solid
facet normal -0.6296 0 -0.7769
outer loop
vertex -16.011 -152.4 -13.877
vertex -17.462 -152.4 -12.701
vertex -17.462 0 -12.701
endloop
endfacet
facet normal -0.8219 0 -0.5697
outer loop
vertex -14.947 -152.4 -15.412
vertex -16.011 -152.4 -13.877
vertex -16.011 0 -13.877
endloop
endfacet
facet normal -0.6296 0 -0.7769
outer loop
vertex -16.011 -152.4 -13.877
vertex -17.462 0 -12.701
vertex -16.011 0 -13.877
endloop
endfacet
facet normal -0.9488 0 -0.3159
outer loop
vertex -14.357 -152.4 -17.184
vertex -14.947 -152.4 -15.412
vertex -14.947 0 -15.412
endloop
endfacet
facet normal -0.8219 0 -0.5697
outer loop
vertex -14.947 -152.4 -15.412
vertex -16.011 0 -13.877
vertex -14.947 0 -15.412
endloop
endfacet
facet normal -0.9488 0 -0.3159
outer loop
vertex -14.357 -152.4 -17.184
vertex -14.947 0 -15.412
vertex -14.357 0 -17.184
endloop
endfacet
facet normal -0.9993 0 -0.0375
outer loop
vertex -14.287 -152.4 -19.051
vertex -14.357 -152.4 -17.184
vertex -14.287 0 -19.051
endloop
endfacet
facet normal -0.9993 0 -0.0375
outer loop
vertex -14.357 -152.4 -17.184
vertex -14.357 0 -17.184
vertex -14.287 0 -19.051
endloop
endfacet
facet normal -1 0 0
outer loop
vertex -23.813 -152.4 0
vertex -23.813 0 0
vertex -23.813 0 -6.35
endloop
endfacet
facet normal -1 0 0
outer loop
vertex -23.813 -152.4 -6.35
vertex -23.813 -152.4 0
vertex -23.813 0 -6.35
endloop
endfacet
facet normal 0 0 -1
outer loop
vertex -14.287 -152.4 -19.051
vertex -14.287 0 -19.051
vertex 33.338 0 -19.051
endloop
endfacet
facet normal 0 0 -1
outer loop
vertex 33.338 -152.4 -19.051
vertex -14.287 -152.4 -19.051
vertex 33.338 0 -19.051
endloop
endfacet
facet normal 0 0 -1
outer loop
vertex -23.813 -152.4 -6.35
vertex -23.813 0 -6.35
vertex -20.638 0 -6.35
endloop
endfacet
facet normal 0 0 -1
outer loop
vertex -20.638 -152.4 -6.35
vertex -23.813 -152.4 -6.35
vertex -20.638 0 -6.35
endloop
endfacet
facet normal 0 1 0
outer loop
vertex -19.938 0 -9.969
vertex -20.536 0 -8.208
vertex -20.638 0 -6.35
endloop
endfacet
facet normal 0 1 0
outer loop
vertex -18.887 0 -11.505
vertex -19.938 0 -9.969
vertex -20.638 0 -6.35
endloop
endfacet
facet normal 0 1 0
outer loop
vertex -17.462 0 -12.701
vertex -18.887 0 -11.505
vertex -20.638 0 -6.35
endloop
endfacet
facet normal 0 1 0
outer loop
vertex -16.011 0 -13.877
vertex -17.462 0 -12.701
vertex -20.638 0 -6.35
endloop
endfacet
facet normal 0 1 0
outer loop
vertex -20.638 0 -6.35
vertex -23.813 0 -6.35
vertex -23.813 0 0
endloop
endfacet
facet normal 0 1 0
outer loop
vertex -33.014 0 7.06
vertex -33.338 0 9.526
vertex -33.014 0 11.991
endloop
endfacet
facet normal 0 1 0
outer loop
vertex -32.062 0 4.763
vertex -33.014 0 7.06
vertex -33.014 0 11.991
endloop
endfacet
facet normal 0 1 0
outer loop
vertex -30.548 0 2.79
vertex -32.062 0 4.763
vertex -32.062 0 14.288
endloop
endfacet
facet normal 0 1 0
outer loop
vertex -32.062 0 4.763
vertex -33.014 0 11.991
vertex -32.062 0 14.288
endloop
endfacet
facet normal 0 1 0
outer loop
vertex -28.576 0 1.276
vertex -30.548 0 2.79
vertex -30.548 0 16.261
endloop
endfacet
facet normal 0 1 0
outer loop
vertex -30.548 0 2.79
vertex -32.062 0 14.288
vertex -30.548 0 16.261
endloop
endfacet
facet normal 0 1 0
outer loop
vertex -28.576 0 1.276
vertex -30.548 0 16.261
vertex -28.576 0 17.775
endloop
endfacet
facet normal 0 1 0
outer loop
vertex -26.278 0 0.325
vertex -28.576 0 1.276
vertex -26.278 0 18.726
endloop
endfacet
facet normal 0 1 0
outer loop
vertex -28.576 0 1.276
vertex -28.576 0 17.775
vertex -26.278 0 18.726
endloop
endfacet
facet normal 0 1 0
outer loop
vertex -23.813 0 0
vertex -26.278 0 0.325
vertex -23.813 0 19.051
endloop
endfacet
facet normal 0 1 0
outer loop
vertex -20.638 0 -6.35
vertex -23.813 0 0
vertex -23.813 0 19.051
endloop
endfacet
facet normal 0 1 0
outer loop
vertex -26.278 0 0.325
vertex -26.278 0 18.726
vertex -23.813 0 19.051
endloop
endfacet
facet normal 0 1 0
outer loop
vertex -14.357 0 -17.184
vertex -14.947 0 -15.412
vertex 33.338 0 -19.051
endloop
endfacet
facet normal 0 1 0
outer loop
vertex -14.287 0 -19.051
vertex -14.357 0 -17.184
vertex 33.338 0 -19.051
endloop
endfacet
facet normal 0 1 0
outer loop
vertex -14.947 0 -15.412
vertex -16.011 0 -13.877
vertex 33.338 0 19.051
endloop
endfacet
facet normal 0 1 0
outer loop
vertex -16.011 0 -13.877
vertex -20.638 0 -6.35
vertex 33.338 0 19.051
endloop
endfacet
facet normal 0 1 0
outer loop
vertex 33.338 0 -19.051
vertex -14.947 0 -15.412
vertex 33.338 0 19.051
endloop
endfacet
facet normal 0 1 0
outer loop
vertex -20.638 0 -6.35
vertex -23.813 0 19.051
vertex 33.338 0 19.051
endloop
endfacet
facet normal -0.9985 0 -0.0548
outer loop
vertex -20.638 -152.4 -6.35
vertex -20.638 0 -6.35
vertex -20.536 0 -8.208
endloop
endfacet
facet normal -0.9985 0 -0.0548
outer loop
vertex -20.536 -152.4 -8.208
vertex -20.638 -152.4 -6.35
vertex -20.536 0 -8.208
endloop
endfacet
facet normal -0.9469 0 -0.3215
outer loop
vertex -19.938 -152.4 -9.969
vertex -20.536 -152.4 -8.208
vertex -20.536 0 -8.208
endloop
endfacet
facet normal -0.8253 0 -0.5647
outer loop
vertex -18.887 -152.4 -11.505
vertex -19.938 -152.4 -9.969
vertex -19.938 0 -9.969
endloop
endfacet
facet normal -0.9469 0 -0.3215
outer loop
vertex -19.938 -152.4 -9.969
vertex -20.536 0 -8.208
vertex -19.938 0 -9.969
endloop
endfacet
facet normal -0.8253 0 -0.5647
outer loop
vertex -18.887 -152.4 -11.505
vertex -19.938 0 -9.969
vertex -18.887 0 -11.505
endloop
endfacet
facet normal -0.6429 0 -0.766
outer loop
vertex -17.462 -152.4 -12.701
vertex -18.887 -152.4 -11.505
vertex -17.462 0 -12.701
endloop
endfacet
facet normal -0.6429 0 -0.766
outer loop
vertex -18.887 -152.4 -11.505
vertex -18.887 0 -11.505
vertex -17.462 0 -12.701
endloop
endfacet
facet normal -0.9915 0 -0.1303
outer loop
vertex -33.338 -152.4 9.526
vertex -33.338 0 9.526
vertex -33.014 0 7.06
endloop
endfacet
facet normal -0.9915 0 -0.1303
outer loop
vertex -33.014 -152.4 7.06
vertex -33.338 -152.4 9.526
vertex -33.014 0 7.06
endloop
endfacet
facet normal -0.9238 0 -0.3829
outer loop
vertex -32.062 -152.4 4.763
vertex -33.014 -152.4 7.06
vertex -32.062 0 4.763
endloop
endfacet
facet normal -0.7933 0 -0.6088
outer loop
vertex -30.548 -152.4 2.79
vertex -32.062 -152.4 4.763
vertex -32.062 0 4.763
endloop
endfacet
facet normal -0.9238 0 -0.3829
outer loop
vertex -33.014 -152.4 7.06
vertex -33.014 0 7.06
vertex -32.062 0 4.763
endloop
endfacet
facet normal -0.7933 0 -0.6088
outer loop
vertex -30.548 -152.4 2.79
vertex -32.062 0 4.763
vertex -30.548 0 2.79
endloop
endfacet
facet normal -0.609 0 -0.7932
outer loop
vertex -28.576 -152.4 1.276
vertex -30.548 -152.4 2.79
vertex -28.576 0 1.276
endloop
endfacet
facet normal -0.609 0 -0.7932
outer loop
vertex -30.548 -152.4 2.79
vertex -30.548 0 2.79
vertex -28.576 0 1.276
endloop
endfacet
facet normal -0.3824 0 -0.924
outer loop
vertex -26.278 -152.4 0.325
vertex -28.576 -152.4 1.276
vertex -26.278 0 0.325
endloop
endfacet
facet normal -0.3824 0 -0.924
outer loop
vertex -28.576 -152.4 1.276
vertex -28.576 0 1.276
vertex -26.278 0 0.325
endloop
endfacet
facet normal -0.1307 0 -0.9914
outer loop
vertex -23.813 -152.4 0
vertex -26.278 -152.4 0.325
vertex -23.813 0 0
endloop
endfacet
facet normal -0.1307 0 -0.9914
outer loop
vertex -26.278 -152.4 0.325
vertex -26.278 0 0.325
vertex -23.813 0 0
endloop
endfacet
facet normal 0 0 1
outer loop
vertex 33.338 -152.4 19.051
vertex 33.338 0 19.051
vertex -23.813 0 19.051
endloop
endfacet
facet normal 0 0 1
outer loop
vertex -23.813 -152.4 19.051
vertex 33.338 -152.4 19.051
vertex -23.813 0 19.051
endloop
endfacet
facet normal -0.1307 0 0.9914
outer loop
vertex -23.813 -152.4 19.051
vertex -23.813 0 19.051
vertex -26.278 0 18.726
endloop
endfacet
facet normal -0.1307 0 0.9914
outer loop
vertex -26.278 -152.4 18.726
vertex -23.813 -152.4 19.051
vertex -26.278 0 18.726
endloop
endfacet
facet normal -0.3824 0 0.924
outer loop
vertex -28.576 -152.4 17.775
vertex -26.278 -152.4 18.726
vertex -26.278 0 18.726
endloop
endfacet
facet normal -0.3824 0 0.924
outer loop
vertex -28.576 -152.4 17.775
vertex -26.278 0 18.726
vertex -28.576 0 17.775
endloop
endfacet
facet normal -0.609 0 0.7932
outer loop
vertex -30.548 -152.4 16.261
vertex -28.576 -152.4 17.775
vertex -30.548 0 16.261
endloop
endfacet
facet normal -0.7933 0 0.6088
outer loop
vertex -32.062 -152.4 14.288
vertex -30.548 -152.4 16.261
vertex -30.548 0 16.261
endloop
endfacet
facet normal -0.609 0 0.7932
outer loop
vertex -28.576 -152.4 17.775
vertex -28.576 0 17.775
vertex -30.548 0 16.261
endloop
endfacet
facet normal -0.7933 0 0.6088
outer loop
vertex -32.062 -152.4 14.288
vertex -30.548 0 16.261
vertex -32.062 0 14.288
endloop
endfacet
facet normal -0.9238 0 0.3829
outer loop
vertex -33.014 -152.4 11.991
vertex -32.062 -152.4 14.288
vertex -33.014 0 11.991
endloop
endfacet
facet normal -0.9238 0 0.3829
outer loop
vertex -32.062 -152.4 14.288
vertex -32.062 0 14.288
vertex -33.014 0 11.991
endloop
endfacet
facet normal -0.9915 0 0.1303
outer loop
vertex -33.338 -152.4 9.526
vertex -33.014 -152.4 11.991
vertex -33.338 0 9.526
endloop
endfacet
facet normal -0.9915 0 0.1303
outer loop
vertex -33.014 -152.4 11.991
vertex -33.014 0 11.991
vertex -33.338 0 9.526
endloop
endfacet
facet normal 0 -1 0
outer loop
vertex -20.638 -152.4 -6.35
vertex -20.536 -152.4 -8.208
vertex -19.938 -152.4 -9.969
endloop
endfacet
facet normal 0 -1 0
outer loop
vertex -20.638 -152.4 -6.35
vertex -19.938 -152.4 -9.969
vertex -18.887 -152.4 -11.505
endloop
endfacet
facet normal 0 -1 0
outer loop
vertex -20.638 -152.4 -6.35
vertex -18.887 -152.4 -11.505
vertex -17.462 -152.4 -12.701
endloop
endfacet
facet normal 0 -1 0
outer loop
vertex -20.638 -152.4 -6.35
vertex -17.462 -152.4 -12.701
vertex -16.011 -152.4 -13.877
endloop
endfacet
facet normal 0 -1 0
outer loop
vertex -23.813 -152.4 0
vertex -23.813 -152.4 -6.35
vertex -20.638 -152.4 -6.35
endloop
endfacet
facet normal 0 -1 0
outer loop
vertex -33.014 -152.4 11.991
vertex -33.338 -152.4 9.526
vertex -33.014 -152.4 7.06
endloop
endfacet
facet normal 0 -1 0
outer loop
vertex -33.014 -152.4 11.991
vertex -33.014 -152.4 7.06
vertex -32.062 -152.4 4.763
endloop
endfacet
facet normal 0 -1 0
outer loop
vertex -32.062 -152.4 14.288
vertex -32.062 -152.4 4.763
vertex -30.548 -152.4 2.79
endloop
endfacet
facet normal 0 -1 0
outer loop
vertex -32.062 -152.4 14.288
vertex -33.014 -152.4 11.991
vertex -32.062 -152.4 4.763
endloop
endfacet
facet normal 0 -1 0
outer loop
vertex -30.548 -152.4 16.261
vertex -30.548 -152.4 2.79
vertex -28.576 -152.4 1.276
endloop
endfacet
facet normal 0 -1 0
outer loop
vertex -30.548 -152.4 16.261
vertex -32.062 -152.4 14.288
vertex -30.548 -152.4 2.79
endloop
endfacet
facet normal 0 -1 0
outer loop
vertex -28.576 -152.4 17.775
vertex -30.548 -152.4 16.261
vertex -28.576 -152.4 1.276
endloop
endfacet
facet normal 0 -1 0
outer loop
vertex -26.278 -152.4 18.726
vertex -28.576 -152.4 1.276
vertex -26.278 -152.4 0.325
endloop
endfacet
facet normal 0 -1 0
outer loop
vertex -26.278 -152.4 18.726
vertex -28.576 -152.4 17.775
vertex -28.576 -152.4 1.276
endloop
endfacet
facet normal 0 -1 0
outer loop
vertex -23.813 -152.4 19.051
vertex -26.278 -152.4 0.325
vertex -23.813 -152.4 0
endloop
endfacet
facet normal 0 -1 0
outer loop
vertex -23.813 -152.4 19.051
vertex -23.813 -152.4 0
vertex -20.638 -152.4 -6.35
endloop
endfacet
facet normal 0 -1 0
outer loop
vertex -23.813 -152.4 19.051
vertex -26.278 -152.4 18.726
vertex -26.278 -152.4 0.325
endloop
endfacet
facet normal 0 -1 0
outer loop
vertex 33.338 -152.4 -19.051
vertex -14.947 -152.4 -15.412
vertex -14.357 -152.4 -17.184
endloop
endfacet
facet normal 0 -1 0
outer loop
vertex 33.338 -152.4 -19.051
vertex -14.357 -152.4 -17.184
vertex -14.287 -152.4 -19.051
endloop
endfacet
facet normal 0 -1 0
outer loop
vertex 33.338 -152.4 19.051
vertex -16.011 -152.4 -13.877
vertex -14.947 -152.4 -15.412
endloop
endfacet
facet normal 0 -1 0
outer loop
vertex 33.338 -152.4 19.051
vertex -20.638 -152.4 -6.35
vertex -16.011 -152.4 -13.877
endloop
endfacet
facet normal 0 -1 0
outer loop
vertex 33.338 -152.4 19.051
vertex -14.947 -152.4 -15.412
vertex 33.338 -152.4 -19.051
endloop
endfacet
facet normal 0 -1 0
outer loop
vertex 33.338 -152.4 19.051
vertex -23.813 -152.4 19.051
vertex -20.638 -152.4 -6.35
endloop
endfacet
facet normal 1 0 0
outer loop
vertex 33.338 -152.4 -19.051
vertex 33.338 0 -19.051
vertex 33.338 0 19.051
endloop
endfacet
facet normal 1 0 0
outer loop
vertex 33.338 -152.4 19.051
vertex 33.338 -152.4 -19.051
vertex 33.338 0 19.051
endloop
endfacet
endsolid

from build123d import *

# Parameters (mm, degrees)
F0_W     = 38.1
F0_H     = 19.05
F0_H_2   = 19.0520574
F1_DEPTH = 152.4


# Not quite as in the source:
# - ends of sketch curves that miss each other by under 0.0002 mm in the source are joined


with BuildPart() as f1:
    # F0 (on Front) → F1 (new body)
    with BuildSketch(Plane.XZ):
        with Locations((14.288262, -9.5260414)):
            Rectangle(F0_W, F0_H)
        with BuildLine():
            Line((-14.287246, -19.0510414), (-4.761738, -19.0510414))
            Line((-4.761738, -19.0510414), (-4.761738, -0.0010414))
            Line((-4.761738, -0.0010414), (-4.761738, 19.051016))
            Line((-4.761738, 19.051016), (-23.812754, 19.051016))
            ThreePointArc((-23.812754, 19.051016), (-30.548305301, 16.261059301), (-33.338262, 9.525508))
            ThreePointArc((-33.338262, 9.525508), (-30.548305301, 2.789956699), (-23.812754, 0))
            Line((-23.812754, 0), (-23.812754, -6.3503556))
            Line((-23.812754, -6.3503556), (-20.6375762, -6.3503556))
            ThreePointArc((-20.6375762, -6.3503556), (-19.9375622279, -9.969300362), (-17.4624299923, -12.700695633))
            ThreePointArc((-17.4624299923, -12.700695633), (-14.947472994, -15.4121856415), (-14.287246, -19.0510414))
        make_face()
        with Locations((14.288262, 9.5249873)):
            Rectangle(F0_W, F0_H_2)
    extrude(amount=F1_DEPTH)


solid = f1.part
